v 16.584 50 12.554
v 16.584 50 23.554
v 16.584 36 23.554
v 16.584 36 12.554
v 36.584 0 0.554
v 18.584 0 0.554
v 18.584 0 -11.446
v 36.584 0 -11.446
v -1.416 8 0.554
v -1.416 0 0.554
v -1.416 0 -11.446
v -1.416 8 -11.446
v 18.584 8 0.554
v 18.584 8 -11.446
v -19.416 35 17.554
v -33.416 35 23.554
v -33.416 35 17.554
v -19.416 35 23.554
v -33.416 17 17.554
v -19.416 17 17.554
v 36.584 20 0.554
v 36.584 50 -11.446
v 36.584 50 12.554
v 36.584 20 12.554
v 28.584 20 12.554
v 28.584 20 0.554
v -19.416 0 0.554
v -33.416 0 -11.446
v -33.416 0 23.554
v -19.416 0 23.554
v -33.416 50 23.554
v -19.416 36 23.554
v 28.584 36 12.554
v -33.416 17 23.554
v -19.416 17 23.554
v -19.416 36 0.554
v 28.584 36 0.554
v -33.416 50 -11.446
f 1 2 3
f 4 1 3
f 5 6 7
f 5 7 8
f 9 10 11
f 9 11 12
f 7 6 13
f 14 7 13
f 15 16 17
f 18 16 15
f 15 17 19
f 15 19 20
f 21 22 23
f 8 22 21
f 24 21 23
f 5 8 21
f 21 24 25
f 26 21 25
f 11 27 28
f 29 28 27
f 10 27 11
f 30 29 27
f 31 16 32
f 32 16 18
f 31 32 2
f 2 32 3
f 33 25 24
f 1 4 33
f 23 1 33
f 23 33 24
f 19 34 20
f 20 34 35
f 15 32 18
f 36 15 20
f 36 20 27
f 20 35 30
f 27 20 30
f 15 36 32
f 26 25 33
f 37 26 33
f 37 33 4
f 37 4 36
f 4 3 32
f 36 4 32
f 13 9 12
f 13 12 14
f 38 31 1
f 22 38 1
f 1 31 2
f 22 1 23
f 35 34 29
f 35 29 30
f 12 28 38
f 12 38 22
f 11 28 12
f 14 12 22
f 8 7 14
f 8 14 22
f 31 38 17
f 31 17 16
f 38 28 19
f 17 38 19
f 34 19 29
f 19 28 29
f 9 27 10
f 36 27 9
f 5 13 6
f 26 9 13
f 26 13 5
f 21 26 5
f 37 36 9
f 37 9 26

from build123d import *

# Parameters (mm, degrees)
F0_W     = 70
F0_H     = 35
F1_DEPTH = 50
F3_DEPTH = 23
F5_DEPTH = 11
F6_W     = 14
F6_H     = 18
F7_DEPTH = 6
F8_W     = 20
F8_H     = 8
F9_DEPTH = 25


with BuildPart() as f1:
    # F0 (on Front) → F1 (new body)
    with BuildSketch(Plane.XZ):
        with Locations((1.583831, 6.053839)):
            Rectangle(F0_W, F0_H)
    extrude(amount=-F1_DEPTH)

    # F2 (on face) → F3 (cut)
    with BuildSketch(Plane.XY.offset(23.553839)):
        Polygon((-19.416169, 0), (36.583831, 0), (36.583831, 20), (28.583831, 20), (28.583831, 36), (-19.416169, 36), align=None)
    extrude(amount=-F3_DEPTH, mode=Mode.SUBTRACT)

    # F4 (on face) → F5 (cut)
    with BuildSketch(Plane.XY.offset(23.553839)):
        Polygon((16.583831, 36), (28.583831, 36), (28.583831, 20), (36.583831, 20), (36.583831, 50), (16.583831, 50), align=None)
    extrude(amount=-F5_DEPTH, mode=Mode.SUBTRACT)

    # F6 (on face) → F7 (cut)
    with BuildSketch(Plane.XY.offset(23.553839)):
        with Locations((-26.416169, 26)):
            Rectangle(F6_W, F6_H)
    extrude(amount=-F7_DEPTH, mode=Mode.SUBTRACT)

    # F8 (on face) → F9 (cut)
    with BuildSketch(Plane.XY.offset(0.553839)):
        with Locations((8.583831, 4)):
            Rectangle(F8_W, F8_H)
    extrude(amount=-F9_DEPTH, mode=Mode.SUBTRACT)


solid = f1.part
